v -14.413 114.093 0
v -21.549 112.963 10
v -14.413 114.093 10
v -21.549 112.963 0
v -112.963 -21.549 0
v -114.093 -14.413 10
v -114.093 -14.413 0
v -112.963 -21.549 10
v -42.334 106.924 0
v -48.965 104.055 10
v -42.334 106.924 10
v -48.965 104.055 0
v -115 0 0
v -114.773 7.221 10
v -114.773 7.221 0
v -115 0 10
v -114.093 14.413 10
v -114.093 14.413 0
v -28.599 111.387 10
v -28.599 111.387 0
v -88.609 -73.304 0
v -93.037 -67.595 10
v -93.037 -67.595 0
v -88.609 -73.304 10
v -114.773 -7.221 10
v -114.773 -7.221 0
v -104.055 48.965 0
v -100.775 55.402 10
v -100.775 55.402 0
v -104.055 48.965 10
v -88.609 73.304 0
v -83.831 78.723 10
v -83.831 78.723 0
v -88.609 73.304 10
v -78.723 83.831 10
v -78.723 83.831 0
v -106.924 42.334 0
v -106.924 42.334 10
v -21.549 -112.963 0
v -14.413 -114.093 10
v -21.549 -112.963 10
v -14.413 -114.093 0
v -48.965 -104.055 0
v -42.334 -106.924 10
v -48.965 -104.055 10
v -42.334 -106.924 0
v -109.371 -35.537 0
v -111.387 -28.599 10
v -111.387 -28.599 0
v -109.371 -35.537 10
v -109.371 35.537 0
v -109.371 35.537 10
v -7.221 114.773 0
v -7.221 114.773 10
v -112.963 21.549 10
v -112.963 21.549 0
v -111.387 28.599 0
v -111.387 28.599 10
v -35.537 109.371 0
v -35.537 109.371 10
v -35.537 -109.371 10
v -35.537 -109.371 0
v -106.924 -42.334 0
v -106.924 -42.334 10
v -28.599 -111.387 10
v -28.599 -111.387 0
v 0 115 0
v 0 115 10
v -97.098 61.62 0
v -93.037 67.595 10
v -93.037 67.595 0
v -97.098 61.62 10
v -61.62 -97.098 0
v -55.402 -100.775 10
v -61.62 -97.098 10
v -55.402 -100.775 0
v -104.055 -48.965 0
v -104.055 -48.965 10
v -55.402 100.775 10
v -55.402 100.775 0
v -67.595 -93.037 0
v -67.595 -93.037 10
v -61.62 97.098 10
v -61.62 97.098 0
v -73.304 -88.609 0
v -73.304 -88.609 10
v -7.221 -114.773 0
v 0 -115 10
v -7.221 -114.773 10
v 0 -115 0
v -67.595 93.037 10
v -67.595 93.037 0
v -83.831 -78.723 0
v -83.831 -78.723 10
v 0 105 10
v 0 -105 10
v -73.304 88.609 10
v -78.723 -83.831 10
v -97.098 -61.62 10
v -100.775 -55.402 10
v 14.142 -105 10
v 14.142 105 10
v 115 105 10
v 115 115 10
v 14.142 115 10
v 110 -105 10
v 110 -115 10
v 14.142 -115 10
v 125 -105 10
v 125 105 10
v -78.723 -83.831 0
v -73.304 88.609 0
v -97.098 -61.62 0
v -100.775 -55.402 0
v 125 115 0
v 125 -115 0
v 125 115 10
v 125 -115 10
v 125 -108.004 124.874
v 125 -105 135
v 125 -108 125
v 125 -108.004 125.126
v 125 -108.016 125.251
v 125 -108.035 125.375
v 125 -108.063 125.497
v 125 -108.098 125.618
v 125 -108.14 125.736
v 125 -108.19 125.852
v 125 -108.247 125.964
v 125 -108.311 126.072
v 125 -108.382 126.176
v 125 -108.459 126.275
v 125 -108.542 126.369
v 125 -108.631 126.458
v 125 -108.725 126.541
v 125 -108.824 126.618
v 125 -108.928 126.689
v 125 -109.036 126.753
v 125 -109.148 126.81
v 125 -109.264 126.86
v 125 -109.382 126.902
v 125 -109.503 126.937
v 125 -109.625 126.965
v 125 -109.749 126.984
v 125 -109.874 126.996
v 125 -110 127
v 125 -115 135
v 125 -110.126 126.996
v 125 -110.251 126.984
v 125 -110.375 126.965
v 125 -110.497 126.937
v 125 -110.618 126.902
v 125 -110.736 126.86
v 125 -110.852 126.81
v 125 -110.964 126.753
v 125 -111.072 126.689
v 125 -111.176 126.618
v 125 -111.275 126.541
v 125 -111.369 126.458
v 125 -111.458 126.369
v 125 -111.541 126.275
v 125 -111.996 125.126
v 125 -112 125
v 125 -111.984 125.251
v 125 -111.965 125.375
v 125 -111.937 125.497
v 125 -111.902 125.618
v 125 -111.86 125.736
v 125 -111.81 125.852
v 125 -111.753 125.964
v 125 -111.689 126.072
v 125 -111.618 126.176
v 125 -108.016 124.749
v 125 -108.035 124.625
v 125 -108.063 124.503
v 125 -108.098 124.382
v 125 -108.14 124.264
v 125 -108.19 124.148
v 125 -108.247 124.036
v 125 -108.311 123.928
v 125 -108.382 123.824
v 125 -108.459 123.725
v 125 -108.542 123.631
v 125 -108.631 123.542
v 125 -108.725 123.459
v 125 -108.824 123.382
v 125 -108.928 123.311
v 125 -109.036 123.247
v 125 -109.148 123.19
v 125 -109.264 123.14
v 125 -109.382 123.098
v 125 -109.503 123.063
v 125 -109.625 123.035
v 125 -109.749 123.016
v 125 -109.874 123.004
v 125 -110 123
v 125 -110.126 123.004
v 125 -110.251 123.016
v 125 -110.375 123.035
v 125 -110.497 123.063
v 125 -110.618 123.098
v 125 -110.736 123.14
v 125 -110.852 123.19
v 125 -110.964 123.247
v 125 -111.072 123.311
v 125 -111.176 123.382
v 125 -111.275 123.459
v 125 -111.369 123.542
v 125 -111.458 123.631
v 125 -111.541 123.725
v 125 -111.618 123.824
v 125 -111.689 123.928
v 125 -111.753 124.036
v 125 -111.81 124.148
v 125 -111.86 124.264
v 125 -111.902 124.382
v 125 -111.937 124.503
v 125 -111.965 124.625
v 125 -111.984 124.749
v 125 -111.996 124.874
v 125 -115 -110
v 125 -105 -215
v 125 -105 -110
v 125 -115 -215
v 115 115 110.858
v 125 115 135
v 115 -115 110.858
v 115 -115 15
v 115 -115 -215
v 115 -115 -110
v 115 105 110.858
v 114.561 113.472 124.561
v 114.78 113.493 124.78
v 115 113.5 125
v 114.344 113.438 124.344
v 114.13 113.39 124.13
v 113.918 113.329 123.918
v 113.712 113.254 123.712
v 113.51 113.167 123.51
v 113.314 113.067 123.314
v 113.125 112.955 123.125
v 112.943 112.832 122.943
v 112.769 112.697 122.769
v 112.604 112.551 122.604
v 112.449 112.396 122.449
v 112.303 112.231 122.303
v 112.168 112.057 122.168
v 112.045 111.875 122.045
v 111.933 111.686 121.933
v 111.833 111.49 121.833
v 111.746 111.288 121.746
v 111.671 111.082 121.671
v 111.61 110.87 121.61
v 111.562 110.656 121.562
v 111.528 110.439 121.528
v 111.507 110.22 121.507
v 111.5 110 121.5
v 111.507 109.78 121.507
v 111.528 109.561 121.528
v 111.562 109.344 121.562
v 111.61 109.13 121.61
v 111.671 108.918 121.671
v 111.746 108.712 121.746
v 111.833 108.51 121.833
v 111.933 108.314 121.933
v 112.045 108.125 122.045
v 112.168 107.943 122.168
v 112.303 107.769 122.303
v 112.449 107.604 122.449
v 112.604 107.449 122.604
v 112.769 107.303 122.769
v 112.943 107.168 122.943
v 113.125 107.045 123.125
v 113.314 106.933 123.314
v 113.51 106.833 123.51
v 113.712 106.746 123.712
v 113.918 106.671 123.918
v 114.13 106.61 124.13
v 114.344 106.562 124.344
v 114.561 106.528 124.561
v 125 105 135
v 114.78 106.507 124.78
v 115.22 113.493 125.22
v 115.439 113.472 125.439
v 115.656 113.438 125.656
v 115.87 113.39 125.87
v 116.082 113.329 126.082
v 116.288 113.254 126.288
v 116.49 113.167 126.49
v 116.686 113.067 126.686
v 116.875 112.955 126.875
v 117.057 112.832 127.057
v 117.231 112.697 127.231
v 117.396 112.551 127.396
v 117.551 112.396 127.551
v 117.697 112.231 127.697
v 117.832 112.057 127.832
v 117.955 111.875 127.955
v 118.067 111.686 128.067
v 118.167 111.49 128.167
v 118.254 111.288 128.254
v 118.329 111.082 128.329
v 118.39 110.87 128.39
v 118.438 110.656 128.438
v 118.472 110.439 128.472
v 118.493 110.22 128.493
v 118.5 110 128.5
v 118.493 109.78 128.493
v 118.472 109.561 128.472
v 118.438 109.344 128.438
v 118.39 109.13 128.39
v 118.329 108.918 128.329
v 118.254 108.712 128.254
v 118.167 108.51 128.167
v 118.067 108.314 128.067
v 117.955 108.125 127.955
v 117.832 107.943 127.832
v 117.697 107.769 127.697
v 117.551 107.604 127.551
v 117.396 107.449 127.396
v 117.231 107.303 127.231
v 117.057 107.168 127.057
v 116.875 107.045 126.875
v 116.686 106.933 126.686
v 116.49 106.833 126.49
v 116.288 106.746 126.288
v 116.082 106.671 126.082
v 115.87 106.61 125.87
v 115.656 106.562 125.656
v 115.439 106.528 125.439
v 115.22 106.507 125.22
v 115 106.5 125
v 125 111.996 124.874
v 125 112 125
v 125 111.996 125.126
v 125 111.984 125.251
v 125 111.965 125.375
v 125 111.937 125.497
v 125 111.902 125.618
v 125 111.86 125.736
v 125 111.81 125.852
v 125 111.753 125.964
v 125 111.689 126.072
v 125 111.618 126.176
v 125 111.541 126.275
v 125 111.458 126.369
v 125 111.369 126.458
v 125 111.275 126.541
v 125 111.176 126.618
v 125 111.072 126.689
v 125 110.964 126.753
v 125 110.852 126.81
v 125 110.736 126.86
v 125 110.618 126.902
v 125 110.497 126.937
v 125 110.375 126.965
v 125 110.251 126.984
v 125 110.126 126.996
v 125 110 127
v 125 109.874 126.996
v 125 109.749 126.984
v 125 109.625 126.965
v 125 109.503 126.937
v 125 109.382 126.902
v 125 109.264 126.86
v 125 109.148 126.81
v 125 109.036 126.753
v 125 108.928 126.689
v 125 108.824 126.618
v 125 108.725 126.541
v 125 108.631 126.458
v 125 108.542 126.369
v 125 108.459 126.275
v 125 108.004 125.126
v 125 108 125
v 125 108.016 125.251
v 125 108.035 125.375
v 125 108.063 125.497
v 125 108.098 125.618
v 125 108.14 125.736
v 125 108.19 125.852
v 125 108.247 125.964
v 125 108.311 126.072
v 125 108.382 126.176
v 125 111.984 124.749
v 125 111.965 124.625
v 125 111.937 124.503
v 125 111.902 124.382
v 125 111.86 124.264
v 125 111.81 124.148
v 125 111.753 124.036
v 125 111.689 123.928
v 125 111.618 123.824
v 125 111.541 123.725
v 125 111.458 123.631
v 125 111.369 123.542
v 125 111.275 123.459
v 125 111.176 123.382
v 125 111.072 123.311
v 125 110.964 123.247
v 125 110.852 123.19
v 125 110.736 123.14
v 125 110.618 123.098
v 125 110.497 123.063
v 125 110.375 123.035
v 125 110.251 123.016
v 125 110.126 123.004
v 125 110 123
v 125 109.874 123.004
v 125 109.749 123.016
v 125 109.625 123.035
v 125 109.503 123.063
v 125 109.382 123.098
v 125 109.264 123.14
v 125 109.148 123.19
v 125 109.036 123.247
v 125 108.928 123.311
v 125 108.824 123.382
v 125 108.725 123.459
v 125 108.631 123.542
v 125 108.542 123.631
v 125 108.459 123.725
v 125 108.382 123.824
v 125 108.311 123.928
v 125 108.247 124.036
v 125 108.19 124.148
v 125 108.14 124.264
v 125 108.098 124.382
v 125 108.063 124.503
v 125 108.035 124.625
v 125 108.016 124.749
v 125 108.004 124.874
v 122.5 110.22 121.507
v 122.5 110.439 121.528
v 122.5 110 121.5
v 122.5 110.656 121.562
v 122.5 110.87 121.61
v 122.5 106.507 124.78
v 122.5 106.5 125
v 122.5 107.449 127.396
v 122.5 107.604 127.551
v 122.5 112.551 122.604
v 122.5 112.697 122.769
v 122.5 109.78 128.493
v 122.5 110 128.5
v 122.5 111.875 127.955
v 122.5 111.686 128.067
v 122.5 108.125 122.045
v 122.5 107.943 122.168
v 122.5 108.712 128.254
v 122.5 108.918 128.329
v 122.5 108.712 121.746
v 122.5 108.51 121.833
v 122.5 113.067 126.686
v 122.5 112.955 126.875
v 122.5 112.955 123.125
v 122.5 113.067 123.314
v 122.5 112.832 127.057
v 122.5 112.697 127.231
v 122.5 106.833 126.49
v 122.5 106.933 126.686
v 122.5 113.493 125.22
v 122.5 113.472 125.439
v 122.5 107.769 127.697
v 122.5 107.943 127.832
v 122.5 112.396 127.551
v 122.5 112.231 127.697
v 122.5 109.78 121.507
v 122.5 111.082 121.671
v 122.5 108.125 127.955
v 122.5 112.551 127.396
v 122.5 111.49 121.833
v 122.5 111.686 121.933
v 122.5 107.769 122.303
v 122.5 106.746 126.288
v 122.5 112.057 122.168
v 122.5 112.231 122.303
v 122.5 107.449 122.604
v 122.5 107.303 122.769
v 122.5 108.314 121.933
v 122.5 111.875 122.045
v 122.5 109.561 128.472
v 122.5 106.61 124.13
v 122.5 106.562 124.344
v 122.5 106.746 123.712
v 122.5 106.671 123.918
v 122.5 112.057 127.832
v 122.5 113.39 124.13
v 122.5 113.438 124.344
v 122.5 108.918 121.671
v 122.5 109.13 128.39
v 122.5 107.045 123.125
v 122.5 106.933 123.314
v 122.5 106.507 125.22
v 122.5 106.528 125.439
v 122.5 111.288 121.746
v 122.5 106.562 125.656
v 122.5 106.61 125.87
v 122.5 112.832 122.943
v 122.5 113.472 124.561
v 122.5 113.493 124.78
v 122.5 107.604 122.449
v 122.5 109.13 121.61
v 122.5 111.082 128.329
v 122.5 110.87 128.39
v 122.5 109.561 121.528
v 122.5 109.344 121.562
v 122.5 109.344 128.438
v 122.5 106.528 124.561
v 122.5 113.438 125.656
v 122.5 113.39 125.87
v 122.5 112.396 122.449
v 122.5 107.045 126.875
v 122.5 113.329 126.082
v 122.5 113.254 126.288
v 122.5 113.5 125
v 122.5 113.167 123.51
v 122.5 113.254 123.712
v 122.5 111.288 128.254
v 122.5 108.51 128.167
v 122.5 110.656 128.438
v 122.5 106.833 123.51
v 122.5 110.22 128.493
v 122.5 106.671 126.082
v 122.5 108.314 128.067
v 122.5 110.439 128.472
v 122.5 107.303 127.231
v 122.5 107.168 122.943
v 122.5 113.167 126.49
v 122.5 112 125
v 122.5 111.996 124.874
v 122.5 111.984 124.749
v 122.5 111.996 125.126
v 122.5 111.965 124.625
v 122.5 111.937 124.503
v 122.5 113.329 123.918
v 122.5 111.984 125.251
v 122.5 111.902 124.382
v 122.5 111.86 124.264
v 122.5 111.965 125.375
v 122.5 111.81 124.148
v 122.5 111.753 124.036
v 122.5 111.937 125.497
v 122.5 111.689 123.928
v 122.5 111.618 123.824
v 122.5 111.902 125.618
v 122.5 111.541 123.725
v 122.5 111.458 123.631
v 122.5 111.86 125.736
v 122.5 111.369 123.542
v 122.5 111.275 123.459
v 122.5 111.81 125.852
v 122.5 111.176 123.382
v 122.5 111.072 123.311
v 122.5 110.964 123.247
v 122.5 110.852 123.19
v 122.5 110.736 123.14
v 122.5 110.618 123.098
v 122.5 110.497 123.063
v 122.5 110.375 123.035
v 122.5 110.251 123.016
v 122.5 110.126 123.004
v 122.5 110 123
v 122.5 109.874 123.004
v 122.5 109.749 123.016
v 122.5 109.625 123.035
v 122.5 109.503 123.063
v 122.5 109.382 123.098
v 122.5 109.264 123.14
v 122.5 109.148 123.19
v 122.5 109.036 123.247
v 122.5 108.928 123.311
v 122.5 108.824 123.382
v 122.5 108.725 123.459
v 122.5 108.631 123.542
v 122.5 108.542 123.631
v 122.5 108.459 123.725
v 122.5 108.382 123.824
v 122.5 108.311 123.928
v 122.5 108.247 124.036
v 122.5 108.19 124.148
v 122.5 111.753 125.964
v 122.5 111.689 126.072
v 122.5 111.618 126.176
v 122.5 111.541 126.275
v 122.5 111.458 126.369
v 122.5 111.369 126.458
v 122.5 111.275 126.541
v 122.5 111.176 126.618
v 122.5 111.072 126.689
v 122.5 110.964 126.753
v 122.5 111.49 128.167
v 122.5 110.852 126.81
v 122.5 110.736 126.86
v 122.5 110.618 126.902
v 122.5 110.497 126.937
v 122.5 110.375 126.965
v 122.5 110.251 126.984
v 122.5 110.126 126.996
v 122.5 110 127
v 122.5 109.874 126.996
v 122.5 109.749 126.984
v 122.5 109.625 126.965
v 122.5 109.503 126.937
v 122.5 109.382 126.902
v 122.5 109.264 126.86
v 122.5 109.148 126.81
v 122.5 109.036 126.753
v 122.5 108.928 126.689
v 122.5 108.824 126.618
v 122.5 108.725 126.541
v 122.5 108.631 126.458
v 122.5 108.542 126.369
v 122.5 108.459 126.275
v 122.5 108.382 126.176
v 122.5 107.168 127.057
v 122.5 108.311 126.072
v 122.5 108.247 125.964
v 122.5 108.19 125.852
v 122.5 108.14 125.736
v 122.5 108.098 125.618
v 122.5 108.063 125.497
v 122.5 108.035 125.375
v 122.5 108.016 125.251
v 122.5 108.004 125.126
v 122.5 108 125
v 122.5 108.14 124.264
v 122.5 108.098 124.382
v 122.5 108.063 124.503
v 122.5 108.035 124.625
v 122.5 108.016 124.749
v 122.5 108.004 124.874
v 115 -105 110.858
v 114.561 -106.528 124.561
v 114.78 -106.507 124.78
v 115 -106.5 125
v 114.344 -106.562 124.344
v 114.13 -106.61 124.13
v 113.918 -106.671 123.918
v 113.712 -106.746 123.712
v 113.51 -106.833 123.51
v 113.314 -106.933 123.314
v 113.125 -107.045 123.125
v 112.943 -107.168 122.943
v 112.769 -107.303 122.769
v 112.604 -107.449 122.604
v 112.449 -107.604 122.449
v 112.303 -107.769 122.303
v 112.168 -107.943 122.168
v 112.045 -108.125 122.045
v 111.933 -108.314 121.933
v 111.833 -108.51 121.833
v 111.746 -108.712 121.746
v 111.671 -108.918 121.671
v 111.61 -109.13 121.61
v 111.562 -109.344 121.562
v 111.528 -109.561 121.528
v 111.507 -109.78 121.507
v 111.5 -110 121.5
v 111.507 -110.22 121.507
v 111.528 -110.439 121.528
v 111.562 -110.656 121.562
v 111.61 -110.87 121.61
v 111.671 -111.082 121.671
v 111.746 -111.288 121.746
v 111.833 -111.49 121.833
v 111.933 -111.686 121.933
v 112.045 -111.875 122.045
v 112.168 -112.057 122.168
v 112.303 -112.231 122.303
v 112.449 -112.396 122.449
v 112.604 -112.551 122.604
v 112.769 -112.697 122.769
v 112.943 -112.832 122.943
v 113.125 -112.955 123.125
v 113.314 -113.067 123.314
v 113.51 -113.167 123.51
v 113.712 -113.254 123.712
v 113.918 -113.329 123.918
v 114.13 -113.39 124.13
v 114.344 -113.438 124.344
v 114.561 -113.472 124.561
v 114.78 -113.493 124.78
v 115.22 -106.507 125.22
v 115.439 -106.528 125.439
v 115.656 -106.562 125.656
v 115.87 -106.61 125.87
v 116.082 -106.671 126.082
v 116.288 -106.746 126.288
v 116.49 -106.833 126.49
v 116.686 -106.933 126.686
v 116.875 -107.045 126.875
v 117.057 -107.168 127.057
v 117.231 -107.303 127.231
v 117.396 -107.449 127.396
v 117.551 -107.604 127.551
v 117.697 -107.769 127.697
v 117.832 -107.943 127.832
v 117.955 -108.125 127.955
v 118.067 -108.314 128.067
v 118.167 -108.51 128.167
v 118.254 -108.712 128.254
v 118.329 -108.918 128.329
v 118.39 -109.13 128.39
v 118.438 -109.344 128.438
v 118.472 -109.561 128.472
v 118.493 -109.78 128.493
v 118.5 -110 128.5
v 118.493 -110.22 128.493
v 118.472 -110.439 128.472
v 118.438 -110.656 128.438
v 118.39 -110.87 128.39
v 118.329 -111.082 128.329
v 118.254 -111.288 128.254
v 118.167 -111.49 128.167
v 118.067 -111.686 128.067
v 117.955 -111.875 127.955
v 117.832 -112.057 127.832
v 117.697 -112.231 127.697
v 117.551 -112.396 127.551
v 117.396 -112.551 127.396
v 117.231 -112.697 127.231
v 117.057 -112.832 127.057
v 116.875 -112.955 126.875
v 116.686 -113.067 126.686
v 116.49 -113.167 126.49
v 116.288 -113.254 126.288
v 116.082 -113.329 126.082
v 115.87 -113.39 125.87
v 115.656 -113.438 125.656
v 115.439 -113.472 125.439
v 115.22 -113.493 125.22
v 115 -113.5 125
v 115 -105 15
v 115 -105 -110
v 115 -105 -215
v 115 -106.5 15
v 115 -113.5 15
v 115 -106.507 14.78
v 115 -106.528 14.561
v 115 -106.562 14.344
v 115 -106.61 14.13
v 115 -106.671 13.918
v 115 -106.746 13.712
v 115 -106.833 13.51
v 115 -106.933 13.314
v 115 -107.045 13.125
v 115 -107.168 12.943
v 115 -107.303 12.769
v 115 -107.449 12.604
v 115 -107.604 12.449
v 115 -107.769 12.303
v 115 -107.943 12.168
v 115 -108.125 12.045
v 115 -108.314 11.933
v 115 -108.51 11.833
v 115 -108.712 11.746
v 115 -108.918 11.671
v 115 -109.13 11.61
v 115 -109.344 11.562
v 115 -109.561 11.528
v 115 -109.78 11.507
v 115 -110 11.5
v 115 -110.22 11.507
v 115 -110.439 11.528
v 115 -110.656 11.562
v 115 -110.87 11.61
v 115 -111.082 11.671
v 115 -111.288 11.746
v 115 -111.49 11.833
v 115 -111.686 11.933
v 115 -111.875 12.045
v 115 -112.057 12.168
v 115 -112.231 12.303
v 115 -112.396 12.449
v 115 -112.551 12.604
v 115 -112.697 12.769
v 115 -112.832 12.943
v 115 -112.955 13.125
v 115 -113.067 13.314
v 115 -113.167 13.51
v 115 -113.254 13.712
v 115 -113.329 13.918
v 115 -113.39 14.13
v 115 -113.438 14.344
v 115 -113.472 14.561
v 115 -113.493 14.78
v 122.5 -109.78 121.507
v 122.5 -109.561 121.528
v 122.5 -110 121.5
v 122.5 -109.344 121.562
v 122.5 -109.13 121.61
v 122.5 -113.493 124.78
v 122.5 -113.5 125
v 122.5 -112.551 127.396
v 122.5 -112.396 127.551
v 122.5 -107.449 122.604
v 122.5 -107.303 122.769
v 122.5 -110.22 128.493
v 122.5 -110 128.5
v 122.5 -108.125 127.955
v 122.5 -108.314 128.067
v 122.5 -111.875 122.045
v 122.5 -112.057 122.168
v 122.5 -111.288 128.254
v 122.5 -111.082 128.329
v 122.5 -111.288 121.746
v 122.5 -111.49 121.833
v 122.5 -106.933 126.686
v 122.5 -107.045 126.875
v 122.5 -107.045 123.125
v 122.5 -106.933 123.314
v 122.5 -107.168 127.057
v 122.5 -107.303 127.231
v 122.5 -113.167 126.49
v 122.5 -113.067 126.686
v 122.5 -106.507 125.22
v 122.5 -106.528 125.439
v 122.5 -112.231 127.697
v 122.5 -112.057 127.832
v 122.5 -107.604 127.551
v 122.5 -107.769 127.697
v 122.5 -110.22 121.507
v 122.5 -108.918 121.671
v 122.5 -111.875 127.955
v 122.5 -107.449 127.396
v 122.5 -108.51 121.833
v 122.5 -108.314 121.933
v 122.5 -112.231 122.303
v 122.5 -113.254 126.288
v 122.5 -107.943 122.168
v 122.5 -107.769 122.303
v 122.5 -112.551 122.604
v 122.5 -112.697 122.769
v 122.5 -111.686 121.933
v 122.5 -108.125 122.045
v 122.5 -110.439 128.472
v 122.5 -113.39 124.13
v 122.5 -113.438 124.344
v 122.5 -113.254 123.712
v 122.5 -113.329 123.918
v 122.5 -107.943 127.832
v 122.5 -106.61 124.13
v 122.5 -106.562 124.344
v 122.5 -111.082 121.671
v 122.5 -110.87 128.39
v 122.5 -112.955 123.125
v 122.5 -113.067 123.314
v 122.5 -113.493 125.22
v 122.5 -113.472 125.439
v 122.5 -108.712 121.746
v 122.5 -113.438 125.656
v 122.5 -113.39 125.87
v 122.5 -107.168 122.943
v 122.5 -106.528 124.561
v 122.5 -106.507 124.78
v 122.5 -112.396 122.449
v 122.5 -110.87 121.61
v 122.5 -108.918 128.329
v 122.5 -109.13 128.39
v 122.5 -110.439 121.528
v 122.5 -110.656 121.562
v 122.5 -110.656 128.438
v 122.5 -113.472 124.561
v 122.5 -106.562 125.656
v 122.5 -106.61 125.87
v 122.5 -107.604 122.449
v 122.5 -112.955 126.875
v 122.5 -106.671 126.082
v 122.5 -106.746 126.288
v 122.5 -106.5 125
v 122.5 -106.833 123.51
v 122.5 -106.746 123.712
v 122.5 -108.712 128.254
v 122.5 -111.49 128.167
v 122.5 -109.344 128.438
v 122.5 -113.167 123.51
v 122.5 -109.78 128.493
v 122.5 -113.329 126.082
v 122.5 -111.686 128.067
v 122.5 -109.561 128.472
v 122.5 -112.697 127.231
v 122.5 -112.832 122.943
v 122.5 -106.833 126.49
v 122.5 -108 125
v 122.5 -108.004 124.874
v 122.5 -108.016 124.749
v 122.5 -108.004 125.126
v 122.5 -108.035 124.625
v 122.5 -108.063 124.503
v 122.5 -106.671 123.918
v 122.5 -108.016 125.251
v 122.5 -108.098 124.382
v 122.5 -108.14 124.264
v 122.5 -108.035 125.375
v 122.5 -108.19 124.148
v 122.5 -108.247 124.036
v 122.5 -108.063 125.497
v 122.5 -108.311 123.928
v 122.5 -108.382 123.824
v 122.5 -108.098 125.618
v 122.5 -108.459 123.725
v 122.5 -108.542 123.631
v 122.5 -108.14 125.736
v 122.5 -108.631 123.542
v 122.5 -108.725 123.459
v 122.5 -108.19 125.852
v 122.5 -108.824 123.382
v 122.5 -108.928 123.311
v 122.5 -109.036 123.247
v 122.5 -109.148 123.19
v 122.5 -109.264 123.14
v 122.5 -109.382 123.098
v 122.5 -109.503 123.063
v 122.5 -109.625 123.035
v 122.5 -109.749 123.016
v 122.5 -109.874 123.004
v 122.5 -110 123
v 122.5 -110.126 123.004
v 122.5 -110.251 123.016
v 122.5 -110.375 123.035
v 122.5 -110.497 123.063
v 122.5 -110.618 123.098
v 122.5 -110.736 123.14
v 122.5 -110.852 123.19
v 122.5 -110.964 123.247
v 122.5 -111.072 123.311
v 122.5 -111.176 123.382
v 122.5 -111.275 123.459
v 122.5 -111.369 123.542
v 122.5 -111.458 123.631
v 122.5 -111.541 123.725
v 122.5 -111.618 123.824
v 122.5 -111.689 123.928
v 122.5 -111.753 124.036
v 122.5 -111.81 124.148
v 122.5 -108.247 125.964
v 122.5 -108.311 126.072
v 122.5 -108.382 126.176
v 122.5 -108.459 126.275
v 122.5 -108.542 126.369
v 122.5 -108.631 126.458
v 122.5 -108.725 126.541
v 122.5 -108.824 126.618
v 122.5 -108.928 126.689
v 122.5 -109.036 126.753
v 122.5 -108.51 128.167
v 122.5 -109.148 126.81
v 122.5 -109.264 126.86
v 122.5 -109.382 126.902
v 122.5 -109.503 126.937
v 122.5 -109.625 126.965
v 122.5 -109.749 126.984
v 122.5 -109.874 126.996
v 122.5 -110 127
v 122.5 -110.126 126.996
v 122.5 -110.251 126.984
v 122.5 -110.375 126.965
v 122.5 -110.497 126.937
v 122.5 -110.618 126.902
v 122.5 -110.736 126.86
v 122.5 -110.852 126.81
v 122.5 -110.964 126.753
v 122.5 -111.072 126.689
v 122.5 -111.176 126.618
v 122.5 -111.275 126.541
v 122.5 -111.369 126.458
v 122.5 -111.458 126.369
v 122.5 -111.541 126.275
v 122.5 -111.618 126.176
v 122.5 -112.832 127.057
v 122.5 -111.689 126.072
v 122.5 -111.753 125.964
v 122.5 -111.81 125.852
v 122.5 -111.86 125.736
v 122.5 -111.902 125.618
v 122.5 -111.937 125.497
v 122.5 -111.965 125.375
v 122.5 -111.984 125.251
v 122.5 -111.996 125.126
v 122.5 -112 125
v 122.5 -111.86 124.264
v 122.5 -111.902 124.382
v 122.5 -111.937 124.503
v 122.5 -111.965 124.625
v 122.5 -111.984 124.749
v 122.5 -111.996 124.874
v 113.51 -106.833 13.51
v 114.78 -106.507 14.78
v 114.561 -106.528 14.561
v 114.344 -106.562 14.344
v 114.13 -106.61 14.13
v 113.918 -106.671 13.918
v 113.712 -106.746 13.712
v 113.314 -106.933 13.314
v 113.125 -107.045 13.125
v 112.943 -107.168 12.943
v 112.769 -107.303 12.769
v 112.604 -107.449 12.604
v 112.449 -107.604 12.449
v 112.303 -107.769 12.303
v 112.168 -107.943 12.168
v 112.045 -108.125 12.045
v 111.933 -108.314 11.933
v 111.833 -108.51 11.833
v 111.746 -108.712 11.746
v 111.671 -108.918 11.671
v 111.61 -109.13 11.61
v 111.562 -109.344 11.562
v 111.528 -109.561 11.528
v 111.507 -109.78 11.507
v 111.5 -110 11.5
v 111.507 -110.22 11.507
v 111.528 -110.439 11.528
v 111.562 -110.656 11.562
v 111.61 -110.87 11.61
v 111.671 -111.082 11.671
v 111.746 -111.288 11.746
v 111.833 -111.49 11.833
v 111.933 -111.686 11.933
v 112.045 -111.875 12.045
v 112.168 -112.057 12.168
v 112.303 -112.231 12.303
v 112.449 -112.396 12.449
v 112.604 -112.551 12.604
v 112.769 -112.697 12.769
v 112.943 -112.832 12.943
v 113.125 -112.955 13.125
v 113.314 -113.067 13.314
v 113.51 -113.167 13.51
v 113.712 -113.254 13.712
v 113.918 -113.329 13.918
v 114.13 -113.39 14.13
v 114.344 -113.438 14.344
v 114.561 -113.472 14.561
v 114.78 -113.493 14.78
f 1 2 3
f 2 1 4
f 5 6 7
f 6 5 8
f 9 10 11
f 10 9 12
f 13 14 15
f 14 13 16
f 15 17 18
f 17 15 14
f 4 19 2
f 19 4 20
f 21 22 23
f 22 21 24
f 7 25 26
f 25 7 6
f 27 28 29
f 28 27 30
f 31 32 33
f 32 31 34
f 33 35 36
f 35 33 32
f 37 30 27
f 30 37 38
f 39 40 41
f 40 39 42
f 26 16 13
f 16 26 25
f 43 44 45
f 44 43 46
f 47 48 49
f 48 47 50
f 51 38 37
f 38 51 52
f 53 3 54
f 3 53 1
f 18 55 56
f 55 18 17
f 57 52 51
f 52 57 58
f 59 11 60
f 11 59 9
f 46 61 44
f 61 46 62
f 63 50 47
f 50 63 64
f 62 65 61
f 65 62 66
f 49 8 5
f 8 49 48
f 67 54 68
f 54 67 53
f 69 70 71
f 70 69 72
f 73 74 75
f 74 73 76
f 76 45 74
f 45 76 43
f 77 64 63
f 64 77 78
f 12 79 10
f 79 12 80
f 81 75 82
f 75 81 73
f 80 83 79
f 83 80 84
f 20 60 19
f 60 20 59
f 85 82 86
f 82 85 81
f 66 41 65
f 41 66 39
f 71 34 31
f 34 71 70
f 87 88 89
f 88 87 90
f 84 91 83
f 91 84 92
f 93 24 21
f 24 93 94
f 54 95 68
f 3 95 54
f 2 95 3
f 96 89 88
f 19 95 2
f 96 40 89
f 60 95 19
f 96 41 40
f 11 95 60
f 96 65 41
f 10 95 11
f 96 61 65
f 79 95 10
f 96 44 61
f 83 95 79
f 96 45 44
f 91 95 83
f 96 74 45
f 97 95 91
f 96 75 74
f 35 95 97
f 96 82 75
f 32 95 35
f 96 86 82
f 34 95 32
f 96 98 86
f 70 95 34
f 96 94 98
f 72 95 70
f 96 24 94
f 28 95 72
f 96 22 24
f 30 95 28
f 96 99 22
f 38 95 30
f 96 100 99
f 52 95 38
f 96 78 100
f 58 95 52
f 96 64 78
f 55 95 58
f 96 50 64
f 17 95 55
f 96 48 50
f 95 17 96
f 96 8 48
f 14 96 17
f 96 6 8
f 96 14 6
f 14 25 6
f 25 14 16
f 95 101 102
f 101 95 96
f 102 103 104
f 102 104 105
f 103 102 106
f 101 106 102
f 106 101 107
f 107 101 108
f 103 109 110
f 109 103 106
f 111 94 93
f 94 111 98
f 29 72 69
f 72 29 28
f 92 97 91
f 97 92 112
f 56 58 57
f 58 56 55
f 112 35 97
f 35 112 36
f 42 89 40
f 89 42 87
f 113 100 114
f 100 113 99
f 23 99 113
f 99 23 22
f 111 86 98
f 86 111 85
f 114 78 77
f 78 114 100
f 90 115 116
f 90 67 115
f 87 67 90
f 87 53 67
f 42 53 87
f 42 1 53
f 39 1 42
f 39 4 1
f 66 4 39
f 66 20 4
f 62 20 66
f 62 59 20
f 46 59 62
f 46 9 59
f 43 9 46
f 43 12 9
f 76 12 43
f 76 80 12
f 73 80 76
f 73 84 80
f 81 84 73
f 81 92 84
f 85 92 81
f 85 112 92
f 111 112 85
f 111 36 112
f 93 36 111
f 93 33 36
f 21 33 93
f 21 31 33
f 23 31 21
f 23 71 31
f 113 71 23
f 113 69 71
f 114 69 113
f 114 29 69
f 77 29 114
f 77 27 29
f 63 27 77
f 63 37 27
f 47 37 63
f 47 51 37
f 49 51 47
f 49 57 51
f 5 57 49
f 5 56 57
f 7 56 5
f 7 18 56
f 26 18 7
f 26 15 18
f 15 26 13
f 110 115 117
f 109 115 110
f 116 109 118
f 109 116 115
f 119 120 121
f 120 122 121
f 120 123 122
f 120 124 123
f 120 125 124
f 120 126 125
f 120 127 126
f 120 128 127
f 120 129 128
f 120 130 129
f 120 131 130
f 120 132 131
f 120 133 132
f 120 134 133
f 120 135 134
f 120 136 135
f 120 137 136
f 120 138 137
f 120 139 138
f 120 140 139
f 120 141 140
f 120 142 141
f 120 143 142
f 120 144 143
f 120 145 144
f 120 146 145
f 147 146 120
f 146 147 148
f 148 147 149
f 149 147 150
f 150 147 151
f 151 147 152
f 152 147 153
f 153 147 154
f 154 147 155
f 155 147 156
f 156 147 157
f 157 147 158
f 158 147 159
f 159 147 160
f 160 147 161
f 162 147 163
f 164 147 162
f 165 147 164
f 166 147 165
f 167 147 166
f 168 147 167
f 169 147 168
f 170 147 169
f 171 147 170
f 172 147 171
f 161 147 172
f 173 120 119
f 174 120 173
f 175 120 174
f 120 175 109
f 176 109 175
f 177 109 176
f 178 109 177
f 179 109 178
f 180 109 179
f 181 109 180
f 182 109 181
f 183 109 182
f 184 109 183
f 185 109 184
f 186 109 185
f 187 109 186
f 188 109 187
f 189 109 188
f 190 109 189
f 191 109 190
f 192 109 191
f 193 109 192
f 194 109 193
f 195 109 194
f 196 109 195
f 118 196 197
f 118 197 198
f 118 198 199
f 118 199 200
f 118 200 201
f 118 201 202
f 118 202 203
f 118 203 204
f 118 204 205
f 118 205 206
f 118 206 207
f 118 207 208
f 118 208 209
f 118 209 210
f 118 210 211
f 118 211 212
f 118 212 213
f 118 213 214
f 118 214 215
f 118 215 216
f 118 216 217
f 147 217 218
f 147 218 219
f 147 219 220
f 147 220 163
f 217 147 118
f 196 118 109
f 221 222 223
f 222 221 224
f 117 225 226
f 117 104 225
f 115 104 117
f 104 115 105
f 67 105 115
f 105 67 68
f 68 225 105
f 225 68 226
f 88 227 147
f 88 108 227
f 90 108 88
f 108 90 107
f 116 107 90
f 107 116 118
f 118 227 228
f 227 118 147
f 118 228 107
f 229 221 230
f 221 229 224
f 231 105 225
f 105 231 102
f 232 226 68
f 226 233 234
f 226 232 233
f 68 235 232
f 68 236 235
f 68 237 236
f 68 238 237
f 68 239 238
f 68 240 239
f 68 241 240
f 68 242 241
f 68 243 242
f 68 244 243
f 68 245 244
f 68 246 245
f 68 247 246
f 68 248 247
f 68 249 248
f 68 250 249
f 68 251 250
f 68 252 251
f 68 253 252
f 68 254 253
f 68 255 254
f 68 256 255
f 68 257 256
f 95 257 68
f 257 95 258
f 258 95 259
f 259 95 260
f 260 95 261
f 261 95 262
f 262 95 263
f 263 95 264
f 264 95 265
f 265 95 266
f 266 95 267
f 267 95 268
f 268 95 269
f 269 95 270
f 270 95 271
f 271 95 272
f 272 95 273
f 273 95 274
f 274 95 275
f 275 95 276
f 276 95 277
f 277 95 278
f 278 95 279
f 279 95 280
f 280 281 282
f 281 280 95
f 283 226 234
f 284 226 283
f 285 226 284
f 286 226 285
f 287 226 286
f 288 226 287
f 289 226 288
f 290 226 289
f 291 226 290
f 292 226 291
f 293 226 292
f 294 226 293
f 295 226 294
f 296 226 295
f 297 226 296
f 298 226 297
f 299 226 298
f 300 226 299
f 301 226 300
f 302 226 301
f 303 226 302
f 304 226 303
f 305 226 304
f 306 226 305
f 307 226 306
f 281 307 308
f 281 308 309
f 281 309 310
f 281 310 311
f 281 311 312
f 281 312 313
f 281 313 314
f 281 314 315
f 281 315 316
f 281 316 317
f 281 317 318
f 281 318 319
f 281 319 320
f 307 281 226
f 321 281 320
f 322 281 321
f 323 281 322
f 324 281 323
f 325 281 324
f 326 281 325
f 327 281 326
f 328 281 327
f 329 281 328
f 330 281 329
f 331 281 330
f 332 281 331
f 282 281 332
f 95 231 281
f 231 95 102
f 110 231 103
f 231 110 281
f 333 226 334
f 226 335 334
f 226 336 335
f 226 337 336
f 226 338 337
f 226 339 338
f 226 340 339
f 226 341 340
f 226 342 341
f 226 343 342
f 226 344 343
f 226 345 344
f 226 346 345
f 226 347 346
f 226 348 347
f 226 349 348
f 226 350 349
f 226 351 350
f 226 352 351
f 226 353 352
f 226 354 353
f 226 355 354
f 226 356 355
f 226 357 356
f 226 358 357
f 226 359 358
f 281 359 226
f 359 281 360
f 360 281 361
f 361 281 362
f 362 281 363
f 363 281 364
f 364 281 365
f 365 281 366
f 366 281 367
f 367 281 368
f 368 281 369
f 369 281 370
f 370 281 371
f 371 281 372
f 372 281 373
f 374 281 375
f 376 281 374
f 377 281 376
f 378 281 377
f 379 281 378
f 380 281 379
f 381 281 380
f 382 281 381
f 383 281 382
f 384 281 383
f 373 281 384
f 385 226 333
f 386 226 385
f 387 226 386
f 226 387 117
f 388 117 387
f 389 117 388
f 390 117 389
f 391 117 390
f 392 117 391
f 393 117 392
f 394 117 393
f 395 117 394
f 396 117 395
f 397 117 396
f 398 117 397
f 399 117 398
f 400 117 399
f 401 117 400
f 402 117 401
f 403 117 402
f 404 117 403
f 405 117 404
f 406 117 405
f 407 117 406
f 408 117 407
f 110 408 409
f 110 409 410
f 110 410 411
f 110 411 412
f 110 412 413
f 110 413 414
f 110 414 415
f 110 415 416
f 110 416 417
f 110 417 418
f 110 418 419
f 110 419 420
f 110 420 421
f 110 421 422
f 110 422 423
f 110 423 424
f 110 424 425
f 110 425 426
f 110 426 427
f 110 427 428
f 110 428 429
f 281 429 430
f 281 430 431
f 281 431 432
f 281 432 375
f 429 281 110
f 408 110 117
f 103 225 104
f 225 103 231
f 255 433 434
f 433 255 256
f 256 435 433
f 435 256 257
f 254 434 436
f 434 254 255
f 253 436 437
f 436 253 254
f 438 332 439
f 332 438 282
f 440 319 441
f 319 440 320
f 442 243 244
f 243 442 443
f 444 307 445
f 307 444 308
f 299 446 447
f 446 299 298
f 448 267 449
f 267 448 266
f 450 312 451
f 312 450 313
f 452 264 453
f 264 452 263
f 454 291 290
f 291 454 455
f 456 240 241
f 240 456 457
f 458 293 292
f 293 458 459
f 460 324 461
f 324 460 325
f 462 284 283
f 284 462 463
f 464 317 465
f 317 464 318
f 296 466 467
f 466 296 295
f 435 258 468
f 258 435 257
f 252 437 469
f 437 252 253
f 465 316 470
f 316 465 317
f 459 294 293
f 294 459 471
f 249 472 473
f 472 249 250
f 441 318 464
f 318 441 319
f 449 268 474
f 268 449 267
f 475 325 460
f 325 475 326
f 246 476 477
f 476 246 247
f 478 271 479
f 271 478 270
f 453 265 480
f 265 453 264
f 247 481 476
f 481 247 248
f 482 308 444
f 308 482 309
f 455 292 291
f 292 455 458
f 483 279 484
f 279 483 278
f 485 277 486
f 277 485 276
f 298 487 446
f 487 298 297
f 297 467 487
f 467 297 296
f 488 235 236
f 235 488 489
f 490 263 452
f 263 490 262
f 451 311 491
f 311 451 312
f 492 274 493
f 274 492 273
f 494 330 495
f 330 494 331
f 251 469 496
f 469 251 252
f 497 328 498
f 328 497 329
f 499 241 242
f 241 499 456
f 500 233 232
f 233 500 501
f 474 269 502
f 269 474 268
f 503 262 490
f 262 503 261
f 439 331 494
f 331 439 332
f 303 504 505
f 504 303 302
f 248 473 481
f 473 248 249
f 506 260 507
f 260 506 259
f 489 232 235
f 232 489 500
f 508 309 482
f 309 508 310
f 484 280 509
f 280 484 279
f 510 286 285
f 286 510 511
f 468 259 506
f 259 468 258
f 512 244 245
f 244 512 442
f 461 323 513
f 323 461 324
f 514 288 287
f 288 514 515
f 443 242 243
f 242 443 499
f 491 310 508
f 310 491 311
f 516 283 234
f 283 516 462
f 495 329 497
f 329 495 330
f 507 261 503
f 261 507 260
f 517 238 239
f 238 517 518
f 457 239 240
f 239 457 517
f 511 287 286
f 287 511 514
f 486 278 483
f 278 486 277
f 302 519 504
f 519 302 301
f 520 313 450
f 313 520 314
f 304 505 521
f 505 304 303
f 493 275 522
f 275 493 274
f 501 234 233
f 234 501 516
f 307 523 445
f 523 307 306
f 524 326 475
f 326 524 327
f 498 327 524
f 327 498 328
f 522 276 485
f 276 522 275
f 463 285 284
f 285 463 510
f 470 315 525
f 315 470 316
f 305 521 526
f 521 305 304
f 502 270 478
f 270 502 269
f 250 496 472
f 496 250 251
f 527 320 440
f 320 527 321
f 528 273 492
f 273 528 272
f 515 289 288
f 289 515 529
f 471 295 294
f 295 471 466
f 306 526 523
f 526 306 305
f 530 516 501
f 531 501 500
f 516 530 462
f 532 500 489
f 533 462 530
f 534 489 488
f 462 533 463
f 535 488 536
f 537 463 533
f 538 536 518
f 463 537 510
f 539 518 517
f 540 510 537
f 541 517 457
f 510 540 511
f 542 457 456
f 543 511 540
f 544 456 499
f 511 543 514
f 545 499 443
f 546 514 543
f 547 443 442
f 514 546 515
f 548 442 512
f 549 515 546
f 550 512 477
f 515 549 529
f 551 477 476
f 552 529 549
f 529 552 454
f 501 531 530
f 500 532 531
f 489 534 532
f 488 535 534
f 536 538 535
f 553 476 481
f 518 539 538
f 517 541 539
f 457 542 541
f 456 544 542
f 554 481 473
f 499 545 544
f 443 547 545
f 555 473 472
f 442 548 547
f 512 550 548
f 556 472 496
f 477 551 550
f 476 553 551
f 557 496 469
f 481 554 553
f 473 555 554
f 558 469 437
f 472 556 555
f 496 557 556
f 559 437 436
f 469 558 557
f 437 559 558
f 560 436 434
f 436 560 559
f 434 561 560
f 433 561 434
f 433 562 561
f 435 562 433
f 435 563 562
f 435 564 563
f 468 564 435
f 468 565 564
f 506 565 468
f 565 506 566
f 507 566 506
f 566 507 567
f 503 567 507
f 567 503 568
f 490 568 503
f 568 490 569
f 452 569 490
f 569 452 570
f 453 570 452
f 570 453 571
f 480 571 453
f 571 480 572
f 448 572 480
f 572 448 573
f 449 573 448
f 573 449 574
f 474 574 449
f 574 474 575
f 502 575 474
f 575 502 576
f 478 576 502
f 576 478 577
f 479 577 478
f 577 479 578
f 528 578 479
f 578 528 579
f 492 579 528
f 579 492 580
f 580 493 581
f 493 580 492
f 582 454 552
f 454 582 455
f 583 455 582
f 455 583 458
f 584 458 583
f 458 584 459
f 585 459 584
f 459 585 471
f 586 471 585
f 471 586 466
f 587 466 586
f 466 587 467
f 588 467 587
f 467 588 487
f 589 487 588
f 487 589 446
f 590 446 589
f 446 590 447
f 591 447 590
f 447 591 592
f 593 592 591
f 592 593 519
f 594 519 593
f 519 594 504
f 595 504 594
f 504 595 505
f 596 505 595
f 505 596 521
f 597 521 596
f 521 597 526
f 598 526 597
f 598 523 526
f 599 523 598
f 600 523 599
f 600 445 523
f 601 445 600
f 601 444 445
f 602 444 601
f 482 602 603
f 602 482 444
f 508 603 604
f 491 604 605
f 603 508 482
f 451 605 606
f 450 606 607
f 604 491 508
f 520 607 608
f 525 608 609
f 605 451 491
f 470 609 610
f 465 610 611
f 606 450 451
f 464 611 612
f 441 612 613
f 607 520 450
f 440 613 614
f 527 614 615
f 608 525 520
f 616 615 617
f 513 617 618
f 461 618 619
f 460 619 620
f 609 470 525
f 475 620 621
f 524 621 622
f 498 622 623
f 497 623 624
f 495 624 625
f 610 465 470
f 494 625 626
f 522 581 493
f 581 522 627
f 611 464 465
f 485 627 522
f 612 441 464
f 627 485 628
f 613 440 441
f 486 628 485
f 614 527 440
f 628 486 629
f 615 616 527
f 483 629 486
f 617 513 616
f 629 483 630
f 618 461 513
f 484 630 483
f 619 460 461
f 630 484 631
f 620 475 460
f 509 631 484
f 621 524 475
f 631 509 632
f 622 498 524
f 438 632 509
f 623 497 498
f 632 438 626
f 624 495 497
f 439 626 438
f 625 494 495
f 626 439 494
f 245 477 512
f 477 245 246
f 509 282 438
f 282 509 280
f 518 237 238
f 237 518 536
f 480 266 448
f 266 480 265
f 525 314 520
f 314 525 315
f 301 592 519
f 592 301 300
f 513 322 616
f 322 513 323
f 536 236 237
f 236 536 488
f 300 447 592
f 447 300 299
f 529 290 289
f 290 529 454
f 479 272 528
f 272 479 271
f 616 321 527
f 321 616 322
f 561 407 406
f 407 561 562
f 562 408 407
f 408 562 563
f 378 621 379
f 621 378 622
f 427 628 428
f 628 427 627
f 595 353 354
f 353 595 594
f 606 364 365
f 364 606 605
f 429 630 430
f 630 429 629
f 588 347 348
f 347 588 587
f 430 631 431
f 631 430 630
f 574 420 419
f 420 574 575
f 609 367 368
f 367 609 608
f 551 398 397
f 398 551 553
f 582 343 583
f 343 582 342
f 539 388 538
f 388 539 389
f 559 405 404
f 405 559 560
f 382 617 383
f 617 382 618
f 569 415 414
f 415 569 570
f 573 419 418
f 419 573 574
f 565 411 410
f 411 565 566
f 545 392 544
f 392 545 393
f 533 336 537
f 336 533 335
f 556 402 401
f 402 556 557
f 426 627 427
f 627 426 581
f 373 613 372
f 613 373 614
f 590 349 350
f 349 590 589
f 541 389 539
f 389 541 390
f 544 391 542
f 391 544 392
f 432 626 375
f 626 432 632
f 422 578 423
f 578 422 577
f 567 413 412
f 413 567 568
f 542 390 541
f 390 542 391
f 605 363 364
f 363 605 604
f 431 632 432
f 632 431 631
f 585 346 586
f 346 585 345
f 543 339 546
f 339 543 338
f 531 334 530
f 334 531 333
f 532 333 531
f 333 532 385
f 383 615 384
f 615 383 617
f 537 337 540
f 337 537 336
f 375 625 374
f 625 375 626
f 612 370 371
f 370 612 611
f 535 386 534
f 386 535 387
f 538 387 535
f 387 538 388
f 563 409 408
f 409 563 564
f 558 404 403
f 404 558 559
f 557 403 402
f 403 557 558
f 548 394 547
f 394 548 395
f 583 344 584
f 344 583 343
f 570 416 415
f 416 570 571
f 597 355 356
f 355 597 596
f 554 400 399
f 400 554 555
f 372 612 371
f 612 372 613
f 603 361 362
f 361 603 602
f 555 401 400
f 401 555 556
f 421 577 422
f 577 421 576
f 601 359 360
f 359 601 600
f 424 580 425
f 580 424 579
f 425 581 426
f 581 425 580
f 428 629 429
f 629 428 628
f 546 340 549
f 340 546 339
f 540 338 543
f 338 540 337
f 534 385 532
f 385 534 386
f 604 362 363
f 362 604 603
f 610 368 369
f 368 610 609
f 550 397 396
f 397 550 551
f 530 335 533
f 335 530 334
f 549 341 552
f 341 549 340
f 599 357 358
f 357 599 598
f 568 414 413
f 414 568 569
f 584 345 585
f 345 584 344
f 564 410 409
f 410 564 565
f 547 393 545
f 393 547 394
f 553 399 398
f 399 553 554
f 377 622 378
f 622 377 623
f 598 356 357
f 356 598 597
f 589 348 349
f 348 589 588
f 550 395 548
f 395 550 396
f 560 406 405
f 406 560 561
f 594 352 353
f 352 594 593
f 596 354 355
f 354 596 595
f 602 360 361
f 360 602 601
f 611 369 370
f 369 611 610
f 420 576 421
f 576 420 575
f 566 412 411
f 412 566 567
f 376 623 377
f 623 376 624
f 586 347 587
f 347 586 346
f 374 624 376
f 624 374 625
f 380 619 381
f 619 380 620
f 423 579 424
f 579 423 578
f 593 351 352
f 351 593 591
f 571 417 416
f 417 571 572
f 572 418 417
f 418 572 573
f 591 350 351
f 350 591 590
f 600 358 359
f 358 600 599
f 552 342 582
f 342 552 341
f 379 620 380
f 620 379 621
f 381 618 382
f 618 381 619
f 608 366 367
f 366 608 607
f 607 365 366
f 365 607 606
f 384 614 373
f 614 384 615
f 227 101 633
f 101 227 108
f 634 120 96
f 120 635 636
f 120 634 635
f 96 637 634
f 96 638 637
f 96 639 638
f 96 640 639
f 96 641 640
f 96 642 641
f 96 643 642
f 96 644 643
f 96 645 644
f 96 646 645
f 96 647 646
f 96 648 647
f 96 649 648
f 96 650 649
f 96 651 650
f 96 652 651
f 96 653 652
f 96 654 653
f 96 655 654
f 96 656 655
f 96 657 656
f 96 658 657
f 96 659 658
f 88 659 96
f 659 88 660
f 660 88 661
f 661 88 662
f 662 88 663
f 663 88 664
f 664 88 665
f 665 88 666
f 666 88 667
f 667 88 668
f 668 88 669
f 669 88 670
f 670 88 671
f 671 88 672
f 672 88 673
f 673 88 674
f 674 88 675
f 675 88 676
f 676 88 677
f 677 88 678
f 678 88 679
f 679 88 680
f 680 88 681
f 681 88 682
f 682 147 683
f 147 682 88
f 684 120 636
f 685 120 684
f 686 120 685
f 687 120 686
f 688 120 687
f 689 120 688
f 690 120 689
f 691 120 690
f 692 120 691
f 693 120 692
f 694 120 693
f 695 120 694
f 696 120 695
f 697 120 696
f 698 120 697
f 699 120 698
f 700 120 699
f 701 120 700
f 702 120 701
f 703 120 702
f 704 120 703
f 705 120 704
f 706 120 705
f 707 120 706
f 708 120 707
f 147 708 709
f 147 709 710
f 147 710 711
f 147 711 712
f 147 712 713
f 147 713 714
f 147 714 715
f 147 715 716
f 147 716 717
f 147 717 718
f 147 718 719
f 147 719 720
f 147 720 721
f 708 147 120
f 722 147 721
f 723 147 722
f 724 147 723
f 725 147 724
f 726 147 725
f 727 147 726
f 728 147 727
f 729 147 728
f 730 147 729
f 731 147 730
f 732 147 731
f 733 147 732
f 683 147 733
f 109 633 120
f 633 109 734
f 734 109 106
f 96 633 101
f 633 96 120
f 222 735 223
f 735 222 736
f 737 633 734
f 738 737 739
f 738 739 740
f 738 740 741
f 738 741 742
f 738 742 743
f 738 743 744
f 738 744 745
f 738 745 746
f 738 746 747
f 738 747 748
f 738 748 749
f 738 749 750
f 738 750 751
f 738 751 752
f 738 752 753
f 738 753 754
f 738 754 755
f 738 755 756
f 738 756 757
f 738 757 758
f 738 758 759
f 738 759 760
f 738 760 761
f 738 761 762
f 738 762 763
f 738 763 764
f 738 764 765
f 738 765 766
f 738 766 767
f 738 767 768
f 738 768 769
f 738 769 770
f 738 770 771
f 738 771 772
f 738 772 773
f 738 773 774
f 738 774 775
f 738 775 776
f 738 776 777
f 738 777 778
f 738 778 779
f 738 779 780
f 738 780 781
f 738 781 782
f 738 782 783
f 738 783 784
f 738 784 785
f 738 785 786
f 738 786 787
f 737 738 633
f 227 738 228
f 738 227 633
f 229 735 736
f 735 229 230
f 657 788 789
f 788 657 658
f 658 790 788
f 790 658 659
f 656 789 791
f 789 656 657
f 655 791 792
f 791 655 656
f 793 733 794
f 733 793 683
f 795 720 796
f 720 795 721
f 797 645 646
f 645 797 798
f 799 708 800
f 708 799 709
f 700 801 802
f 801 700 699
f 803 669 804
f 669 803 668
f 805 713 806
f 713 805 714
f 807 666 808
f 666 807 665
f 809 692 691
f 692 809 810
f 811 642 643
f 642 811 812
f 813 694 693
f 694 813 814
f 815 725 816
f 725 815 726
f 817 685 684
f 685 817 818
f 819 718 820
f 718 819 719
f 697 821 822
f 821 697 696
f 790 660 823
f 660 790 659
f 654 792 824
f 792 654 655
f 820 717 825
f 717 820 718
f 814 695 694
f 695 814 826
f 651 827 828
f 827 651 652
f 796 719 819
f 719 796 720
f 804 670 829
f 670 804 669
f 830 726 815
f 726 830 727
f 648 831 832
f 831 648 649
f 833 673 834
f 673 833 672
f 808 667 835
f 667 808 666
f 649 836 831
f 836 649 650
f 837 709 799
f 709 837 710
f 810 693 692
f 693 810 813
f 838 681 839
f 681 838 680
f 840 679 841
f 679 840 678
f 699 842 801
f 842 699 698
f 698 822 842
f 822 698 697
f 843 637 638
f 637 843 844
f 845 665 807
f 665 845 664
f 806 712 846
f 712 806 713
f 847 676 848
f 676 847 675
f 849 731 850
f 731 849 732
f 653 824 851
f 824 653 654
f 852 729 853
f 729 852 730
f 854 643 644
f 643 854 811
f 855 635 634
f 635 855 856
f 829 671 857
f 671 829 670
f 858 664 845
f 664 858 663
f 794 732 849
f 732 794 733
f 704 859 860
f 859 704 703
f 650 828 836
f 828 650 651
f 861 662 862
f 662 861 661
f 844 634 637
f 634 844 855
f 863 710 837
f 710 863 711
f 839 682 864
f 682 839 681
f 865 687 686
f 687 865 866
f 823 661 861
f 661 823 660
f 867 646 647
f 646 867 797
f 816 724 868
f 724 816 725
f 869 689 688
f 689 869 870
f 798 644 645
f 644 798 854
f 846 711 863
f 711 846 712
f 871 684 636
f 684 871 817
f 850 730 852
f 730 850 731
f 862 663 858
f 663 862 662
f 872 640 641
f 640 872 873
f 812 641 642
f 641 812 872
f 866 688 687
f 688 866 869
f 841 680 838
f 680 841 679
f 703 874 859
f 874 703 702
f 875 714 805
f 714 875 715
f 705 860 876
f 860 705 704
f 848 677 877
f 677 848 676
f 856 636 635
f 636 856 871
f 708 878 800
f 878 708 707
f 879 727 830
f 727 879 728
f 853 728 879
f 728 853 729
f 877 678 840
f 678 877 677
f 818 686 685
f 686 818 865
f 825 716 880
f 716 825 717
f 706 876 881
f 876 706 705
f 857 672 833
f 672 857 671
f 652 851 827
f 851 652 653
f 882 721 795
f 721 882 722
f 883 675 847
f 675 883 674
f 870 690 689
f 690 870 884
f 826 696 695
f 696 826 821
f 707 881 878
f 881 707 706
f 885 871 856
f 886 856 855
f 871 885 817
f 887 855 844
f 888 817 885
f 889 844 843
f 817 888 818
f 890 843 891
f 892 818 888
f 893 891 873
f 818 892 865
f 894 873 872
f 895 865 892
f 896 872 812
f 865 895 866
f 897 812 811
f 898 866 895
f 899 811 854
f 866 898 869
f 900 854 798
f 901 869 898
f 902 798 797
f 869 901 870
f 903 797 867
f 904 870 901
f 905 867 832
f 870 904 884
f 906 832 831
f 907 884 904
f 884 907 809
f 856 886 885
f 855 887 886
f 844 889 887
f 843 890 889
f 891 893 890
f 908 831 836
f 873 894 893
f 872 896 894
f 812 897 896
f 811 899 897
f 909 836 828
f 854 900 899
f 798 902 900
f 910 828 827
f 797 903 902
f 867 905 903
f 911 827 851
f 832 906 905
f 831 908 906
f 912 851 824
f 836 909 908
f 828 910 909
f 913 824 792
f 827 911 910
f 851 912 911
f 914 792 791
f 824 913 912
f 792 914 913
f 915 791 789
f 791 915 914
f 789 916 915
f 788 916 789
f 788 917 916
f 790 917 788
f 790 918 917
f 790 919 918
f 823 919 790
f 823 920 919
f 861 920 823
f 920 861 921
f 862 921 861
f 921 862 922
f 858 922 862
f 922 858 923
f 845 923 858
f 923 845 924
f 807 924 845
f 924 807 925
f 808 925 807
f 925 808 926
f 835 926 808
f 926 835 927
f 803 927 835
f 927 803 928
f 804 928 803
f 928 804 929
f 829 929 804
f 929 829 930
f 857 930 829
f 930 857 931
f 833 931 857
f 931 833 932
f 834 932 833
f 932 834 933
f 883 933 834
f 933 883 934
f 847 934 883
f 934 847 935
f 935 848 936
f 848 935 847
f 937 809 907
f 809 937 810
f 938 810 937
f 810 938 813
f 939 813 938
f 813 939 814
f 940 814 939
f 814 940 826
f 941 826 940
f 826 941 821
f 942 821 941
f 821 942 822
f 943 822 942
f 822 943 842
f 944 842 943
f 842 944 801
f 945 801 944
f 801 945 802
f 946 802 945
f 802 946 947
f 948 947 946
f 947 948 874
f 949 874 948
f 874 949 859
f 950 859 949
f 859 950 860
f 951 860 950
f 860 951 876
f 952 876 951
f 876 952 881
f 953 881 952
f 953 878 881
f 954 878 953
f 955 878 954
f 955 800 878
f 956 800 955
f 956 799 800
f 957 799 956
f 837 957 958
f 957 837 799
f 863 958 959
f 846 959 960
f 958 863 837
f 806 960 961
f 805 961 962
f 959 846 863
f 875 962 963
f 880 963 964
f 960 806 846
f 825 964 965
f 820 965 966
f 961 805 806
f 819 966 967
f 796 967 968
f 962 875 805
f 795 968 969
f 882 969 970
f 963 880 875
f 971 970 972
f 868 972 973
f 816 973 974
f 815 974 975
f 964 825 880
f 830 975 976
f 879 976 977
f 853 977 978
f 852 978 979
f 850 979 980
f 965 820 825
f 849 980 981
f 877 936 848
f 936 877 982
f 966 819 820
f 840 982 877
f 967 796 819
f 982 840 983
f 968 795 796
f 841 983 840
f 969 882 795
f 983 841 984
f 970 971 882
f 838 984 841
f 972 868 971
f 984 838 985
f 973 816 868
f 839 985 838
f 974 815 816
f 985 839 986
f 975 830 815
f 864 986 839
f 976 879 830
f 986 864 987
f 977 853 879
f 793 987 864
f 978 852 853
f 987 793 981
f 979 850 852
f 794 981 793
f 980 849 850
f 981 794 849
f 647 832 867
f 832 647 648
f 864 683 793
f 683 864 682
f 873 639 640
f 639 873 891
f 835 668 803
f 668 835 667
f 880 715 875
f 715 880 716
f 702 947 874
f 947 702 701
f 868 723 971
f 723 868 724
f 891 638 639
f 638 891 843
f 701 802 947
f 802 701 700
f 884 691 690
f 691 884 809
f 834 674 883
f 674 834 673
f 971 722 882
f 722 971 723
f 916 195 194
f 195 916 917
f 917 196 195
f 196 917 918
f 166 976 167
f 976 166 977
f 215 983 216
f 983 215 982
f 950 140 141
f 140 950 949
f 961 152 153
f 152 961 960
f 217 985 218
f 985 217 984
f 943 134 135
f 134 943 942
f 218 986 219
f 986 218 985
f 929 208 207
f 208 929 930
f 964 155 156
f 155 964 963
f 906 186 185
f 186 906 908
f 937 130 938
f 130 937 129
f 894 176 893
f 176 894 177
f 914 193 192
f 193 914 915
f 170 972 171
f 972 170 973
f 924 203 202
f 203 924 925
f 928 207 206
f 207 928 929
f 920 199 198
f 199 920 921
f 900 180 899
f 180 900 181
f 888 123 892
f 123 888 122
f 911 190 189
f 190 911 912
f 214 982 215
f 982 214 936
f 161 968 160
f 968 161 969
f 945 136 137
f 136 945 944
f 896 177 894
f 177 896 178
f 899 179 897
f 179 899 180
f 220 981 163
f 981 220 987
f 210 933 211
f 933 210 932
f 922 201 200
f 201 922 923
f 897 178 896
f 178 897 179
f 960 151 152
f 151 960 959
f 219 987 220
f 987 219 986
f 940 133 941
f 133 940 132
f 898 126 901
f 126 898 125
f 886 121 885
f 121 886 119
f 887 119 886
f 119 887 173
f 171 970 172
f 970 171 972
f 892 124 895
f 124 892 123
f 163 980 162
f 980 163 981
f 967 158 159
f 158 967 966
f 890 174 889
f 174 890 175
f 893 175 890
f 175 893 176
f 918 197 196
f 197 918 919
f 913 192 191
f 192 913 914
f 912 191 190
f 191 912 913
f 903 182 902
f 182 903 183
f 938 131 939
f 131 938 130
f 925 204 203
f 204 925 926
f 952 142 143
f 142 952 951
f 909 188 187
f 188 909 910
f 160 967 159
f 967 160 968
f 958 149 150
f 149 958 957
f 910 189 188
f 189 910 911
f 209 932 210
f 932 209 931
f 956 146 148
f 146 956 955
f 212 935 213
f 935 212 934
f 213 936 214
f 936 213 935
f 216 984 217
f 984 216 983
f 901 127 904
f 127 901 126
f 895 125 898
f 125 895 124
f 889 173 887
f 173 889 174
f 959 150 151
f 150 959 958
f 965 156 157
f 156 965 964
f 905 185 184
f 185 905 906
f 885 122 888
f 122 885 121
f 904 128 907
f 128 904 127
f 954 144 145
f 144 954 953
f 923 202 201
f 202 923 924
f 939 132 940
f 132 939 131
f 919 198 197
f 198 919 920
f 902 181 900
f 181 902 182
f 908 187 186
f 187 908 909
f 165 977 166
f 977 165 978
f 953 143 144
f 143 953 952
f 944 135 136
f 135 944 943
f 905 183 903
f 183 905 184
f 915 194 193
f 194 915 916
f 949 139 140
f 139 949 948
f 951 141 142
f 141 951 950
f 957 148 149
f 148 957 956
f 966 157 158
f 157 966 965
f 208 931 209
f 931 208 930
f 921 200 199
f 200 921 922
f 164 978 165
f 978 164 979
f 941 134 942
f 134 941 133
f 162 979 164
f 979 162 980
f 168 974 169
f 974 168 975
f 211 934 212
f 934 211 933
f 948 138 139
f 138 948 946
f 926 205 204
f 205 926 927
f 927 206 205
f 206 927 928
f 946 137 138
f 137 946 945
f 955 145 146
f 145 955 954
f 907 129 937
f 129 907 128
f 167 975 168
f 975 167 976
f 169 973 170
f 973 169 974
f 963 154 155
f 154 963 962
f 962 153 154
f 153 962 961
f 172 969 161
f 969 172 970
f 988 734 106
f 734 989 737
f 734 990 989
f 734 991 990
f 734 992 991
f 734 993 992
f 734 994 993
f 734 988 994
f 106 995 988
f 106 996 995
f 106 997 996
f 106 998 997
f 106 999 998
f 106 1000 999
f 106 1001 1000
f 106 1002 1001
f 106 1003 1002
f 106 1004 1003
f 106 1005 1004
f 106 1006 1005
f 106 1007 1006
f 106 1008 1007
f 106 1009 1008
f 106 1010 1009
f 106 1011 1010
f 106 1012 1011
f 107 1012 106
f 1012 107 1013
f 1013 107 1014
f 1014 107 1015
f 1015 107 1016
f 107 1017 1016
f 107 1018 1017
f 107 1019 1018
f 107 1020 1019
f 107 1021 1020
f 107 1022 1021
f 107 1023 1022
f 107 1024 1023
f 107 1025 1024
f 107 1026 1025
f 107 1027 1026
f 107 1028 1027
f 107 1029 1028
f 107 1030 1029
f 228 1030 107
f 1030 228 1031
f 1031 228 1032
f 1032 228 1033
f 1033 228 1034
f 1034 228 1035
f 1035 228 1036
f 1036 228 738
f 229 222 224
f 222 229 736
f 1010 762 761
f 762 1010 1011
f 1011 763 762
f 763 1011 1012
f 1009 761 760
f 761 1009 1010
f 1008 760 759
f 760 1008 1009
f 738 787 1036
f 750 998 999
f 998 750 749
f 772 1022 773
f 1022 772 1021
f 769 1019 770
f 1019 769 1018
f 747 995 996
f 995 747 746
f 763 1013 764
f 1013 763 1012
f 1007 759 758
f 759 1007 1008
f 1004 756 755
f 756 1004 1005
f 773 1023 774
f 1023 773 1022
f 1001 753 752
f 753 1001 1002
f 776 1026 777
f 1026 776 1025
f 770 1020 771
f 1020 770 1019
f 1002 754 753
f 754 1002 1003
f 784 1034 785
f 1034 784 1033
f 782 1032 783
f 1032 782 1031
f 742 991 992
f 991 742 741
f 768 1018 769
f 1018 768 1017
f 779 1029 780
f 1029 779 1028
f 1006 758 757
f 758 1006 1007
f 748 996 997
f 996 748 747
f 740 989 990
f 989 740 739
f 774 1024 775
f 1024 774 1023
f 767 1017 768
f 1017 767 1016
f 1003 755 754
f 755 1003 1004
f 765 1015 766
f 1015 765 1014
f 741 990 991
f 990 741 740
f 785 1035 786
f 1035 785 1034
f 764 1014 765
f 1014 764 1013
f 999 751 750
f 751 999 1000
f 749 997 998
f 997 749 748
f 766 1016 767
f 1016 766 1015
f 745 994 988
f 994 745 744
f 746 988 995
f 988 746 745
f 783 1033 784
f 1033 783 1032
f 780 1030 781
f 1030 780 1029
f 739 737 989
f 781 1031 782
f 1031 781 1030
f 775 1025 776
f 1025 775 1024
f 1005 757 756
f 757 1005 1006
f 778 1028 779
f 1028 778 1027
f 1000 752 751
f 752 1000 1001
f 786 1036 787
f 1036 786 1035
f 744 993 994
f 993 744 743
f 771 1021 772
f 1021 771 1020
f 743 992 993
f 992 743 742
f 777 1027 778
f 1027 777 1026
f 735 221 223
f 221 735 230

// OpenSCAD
// file: ../lib/air-purifier-shelf-lib.scad
// BEGIN_DESCRIPTION
// A wall-mounted round shelf for the Levoit Core 200S air purifier
// (Amazon B08FJ678YK — 186mm dia × 312mm tall, ~2.5 kg).
//
// The shelf is a disk with two diagonal truss struts that brace it
// against a flat wall. Two screws per strut anchor it; the
// counterbored holes accept the screw head and a thru-pass for a
// #6 wood screw or M3.5 wall anchor.
//
// A 230mm shelf gives the purifier ~22mm of margin all around — enough
// for the rubberized base feet to sit fully on the plate without
// overhanging.
// END_DESCRIPTION

// BEGIN_PARAMS
// Outer diameter of the shelf plate, in mm.
// 230mm fits the Levoit Core 200S (186mm) with a 22mm margin.
// Increase for larger purifiers; check that your wall has space.
shelf_diameter = 230;

// Plate / truss material thickness, in mm.
// 10mm is rigid enough for ~3 kg loads in PLA when printed solid;
// drop to 8mm for PETG or to save filament.
shelf_thickness = 10;

// Screw head counterbore radius, in mm.
// 3.5mm fits a #6 pan-head wood screw or an M3.5 anchor.
screw_hole_radius = 3.5;

// Screw shank thru-hole radius, in mm.
// 2mm clears an M3 / #6 screw shank cleanly.
screw_hole_thru_radius = 2;
// END_PARAMS

// ============================================================
// Helper modules
// ============================================================

// Truss strut: a 45° diagonal beam plus a vertical back leg that
// presses against the wall. Two screw holes punch through the back
// leg — counterbored from the wall side, thru-hole all the way.
module strut() {
    difference() {
        union() {
            rotate([0, 45, 0])
                cube([shelf_thickness, shelf_thickness, shelf_diameter]);
            translate([shelf_diameter / 2, 0, -shelf_diameter / 2])
                cube([shelf_thickness, shelf_thickness, shelf_diameter]);
        }

        // Counterbore + thru-hole through the back leg
        translate([(shelf_diameter / 2) - shelf_thickness - (shelf_thickness / 4),
                   shelf_thickness / 2,
                   shelf_diameter / 2]) {
            rotate([0, 90, 0]) {
                cylinder(h = shelf_thickness * 2, r = screw_hole_radius);
                cylinder(h = shelf_thickness * 4, r = screw_hole_thru_radius);
            }
        }

        // Clip the strut to the back of the wall plane
        translate([(shelf_diameter / 2) + shelf_thickness, 0, 0])
            cube([shelf_diameter, shelf_diameter, shelf_diameter]);
    }
}

// The shelf plate plus the wall-side back plate that the struts attach to.
module base() {
    union() {
        linear_extrude(shelf_thickness)
            circle(shelf_diameter / 2);
        translate([0, -shelf_diameter / 2, 0])
            cube([(shelf_diameter / 2) + shelf_thickness,
                  shelf_diameter,
                  shelf_thickness]);
    }
}

// ============================================================
// Public modules
// ============================================================

// Complete shelf assembly: round plate + two diagonal struts + bottom
// support strut, with everything below the base plane trimmed.
module shelf() {
    difference() {
        union() {
            base();

            // Left truss (top of plate)
            translate([0, (shelf_diameter / 2) - shelf_thickness, shelf_thickness])
                strut();

            // Right truss (bottom of plate)
            translate([0, -(shelf_diameter / 2), shelf_thickness])
                strut();

            // Right-bottom support strut
            translate([0,
                       -(shelf_diameter / 2),
                       shelf_thickness / 2 + shelf_thickness - (shelf_diameter / 2)])
                strut();
        }

        // Trim everything below the base plane
        translate([0, 0, -shelf_thickness * 11])
            scale([1, 1, 11])
                base();
    }
}
// main file
include <../lib/air-purifier-shelf-lib.scad>;
$fn = 100;
shelf();
